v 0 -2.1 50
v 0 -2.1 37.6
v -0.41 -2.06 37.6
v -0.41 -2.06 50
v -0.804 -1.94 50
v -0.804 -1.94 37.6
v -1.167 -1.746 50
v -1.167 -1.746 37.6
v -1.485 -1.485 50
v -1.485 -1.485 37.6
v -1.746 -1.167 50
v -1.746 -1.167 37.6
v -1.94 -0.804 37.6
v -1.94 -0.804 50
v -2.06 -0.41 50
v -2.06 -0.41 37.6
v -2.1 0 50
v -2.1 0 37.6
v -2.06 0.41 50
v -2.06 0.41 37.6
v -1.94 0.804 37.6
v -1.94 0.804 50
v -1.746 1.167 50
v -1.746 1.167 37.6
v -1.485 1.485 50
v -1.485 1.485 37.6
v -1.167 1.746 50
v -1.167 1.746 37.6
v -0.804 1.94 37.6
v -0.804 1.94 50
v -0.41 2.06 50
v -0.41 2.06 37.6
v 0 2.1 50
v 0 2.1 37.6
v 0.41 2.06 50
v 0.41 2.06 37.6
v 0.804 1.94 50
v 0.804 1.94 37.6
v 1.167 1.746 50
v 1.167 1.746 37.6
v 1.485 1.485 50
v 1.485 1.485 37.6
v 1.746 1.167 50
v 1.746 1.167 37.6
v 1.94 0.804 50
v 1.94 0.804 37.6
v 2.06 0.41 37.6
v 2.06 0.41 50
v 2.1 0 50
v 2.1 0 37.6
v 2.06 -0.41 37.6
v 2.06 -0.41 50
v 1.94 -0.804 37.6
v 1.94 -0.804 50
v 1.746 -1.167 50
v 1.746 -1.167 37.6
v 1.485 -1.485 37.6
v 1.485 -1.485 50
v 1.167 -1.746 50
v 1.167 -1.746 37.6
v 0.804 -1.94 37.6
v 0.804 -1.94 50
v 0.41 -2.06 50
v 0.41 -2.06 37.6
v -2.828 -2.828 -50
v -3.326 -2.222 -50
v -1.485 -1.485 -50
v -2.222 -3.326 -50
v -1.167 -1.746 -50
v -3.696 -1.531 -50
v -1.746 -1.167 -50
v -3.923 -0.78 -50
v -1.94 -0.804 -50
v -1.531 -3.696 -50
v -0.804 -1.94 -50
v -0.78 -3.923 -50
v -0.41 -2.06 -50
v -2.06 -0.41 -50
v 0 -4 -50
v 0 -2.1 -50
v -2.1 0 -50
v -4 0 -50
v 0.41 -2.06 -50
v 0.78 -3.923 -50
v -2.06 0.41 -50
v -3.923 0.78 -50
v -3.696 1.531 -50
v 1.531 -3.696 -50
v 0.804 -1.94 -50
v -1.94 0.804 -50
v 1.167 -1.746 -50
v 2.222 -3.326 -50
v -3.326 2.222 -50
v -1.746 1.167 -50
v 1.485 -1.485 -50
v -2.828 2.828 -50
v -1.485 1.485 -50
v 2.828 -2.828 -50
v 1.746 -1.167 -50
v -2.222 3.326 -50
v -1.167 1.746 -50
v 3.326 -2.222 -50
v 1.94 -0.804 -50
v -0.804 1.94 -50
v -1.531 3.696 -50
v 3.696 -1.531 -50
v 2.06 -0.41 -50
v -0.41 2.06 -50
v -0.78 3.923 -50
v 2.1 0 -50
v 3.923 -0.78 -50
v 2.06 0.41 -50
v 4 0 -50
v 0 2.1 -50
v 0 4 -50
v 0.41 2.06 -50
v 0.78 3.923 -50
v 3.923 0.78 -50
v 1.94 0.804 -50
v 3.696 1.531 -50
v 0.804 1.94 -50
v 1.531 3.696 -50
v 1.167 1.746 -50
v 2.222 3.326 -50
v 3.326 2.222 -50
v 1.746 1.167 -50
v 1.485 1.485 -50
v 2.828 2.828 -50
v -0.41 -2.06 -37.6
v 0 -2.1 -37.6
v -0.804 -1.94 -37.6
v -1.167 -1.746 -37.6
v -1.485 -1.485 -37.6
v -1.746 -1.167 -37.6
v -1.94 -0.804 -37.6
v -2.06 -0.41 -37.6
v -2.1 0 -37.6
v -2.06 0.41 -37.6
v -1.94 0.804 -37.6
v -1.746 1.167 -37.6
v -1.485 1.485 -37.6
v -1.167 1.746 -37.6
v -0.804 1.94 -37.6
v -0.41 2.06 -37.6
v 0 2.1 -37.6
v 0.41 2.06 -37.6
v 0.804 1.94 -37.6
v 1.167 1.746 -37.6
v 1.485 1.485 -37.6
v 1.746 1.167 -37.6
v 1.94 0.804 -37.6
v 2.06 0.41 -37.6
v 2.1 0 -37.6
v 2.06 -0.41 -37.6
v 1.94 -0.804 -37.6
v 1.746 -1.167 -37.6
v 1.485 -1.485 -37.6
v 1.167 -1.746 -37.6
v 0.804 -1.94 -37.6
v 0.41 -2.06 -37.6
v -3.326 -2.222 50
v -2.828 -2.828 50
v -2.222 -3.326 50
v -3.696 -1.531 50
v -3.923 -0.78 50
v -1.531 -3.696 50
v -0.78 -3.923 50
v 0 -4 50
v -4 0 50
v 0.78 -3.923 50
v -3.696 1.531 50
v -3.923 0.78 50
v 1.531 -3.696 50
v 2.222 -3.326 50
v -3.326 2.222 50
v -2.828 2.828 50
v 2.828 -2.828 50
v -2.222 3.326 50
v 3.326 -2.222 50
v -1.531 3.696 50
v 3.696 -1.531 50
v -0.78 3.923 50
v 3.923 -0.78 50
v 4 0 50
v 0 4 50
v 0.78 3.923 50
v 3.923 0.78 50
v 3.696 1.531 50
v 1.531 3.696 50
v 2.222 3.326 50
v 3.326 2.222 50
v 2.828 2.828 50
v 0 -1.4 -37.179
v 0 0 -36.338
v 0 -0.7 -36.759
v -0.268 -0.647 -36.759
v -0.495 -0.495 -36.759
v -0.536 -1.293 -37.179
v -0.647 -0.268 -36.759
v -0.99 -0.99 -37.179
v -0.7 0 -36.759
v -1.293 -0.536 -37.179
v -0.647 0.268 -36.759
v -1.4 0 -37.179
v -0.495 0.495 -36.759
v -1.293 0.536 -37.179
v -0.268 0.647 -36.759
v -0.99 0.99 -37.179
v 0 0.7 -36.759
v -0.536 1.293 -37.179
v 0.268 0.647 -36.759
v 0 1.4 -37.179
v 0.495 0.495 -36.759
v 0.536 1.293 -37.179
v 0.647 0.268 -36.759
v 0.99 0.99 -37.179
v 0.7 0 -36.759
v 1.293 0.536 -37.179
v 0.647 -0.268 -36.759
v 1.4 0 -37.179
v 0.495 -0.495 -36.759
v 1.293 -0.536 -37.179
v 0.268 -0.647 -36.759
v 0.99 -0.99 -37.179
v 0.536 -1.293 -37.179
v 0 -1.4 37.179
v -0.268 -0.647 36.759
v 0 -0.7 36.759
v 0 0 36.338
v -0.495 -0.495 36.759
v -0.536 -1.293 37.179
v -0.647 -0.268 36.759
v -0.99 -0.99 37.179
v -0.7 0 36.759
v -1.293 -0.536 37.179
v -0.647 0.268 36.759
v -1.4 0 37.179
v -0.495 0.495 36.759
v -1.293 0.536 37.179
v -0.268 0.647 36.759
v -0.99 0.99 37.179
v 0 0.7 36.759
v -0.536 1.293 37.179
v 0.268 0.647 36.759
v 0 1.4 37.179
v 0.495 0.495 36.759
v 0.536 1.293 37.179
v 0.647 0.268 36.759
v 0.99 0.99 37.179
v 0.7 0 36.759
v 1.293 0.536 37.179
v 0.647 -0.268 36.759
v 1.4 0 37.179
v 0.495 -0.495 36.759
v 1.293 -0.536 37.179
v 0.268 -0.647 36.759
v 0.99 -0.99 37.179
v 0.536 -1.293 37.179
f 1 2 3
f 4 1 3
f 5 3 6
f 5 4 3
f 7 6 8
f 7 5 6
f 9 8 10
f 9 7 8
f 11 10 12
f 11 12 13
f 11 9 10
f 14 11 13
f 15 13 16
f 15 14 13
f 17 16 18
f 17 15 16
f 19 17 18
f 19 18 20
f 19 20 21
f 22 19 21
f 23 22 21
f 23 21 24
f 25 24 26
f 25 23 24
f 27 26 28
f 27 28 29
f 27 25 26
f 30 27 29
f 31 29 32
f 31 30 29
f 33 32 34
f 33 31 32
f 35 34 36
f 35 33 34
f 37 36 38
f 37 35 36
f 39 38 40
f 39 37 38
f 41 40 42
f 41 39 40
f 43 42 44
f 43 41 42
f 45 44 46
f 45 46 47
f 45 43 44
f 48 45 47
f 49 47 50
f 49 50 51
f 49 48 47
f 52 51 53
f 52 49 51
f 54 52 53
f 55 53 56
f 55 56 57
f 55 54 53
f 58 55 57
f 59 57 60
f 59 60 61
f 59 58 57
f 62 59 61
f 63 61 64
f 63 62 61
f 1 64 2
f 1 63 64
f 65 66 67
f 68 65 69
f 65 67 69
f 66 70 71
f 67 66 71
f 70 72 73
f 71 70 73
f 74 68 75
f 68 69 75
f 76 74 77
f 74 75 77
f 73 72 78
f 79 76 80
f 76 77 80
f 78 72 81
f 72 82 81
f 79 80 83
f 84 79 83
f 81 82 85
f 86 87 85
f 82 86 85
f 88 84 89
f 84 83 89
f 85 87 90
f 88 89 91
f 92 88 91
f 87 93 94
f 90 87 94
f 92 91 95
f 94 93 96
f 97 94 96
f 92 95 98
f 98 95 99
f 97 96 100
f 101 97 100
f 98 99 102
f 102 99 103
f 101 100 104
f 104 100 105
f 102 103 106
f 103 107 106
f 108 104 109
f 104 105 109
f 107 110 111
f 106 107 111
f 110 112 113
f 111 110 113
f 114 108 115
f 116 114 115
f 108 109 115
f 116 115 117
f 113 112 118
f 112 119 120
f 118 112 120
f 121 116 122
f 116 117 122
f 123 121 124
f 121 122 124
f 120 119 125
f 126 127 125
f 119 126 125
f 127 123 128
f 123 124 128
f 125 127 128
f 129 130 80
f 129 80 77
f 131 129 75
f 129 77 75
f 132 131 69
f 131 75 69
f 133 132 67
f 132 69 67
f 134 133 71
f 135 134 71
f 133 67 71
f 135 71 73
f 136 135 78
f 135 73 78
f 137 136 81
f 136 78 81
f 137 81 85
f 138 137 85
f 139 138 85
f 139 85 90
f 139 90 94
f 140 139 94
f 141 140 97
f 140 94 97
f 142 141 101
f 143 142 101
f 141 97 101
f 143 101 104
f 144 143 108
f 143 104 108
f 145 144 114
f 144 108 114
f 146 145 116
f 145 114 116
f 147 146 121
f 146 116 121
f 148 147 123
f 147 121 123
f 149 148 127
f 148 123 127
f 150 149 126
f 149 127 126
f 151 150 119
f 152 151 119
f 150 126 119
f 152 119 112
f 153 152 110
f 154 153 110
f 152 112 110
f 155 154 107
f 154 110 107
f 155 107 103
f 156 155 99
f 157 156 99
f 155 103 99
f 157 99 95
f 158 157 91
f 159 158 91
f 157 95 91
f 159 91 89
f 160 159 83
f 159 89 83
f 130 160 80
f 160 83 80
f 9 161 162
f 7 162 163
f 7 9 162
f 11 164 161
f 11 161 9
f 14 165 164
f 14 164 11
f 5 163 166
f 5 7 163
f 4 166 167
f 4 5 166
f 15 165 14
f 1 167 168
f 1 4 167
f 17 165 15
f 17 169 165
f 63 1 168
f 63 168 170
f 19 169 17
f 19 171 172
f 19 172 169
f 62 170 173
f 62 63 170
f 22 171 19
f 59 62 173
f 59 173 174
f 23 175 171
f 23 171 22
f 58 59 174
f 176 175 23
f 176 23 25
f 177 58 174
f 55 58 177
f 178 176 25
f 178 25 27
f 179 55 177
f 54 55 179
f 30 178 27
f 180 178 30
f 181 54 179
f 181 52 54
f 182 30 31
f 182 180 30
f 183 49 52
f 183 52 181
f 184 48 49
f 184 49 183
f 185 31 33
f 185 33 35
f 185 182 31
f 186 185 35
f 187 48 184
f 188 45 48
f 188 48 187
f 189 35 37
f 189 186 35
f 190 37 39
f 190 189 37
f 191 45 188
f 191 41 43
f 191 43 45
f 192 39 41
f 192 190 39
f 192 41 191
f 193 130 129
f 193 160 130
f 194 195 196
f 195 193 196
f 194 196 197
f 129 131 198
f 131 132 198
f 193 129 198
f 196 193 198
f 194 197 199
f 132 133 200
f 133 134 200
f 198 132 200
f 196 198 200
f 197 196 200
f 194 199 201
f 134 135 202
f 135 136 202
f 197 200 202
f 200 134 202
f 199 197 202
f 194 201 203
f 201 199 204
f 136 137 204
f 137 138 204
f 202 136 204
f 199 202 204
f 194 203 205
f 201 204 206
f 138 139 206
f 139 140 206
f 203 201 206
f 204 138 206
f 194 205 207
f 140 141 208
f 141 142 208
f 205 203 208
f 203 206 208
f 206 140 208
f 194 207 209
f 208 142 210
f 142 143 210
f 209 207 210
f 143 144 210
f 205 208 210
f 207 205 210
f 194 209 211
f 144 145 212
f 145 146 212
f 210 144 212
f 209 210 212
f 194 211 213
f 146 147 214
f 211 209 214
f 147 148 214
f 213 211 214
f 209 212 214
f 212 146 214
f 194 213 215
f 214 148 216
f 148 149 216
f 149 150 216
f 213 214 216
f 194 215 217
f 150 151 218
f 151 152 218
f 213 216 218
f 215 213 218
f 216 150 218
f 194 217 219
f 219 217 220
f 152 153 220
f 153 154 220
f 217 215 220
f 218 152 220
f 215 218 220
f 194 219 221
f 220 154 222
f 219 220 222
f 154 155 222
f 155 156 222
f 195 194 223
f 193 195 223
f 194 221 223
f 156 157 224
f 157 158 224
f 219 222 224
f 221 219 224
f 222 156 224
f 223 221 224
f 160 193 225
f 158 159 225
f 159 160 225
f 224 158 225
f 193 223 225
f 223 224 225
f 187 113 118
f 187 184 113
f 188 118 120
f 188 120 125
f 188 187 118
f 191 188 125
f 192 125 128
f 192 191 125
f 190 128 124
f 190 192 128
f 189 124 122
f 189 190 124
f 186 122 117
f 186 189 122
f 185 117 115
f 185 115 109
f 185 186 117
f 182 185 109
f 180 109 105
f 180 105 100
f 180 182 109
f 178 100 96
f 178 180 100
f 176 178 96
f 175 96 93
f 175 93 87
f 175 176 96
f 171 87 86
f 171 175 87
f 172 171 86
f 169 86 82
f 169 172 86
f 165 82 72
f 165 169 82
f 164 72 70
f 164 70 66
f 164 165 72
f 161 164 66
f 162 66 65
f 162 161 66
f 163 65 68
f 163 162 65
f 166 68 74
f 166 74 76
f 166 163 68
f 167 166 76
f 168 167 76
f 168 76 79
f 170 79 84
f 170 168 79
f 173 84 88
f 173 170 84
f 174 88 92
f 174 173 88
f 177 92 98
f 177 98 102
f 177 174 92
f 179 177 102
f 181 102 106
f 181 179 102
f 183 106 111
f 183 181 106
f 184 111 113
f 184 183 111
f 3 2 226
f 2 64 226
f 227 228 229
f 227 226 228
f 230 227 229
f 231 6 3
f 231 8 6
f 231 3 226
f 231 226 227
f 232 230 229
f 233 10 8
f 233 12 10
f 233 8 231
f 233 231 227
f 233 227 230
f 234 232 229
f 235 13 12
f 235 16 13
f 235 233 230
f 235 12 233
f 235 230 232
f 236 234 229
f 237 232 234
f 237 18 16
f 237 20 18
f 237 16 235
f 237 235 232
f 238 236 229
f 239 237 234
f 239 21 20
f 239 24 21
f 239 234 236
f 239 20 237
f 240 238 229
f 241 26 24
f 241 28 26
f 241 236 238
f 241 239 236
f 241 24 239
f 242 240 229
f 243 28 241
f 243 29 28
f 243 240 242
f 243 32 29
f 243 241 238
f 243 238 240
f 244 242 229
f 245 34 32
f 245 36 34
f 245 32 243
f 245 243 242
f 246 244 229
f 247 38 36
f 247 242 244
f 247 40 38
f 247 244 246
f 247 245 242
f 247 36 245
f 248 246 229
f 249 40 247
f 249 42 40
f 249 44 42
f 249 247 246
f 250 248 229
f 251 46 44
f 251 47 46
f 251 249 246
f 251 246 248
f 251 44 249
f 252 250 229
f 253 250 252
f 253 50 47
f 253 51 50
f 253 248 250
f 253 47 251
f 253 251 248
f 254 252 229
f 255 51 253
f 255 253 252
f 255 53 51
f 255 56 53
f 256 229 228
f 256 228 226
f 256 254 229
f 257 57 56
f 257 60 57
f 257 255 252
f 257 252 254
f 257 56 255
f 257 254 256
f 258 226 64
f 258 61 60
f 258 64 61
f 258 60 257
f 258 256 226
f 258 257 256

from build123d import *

# Parameters (mm, degrees)
SKETCH_1_R      = 4
EXTRUDE_1_DEPTH = 50


with BuildPart() as part:
    # 草图1 → 凸台-拉伸1 (new, symmetric)
    with BuildSketch(Plane.XY):
        Circle(SKETCH_1_R)
    extrude(amount=EXTRUDE_1_DEPTH, both=True)

    # 草图3 → M5 螺纹孔1 (revolve, cut)
    with BuildSketch(Plane(origin=(0, 0, 50), x_dir=(0, -1, 0), z_dir=(1, 0, 0))):
        Polygon((0, 0), (0, 13.6618073), (2.1, 12.4), (2.1, 0), align=None)
    hole_wizard_m5_1 = revolve(axis=Axis((0, 0, 56.35), (0, 0, -1)), mode=Mode.SUBTRACT)

    # 镜向1: M5 螺纹孔1 across plane
    add(hole_wizard_m5_1.mirror(Plane.XY), mode=Mode.SUBTRACT)


solid = part.part
